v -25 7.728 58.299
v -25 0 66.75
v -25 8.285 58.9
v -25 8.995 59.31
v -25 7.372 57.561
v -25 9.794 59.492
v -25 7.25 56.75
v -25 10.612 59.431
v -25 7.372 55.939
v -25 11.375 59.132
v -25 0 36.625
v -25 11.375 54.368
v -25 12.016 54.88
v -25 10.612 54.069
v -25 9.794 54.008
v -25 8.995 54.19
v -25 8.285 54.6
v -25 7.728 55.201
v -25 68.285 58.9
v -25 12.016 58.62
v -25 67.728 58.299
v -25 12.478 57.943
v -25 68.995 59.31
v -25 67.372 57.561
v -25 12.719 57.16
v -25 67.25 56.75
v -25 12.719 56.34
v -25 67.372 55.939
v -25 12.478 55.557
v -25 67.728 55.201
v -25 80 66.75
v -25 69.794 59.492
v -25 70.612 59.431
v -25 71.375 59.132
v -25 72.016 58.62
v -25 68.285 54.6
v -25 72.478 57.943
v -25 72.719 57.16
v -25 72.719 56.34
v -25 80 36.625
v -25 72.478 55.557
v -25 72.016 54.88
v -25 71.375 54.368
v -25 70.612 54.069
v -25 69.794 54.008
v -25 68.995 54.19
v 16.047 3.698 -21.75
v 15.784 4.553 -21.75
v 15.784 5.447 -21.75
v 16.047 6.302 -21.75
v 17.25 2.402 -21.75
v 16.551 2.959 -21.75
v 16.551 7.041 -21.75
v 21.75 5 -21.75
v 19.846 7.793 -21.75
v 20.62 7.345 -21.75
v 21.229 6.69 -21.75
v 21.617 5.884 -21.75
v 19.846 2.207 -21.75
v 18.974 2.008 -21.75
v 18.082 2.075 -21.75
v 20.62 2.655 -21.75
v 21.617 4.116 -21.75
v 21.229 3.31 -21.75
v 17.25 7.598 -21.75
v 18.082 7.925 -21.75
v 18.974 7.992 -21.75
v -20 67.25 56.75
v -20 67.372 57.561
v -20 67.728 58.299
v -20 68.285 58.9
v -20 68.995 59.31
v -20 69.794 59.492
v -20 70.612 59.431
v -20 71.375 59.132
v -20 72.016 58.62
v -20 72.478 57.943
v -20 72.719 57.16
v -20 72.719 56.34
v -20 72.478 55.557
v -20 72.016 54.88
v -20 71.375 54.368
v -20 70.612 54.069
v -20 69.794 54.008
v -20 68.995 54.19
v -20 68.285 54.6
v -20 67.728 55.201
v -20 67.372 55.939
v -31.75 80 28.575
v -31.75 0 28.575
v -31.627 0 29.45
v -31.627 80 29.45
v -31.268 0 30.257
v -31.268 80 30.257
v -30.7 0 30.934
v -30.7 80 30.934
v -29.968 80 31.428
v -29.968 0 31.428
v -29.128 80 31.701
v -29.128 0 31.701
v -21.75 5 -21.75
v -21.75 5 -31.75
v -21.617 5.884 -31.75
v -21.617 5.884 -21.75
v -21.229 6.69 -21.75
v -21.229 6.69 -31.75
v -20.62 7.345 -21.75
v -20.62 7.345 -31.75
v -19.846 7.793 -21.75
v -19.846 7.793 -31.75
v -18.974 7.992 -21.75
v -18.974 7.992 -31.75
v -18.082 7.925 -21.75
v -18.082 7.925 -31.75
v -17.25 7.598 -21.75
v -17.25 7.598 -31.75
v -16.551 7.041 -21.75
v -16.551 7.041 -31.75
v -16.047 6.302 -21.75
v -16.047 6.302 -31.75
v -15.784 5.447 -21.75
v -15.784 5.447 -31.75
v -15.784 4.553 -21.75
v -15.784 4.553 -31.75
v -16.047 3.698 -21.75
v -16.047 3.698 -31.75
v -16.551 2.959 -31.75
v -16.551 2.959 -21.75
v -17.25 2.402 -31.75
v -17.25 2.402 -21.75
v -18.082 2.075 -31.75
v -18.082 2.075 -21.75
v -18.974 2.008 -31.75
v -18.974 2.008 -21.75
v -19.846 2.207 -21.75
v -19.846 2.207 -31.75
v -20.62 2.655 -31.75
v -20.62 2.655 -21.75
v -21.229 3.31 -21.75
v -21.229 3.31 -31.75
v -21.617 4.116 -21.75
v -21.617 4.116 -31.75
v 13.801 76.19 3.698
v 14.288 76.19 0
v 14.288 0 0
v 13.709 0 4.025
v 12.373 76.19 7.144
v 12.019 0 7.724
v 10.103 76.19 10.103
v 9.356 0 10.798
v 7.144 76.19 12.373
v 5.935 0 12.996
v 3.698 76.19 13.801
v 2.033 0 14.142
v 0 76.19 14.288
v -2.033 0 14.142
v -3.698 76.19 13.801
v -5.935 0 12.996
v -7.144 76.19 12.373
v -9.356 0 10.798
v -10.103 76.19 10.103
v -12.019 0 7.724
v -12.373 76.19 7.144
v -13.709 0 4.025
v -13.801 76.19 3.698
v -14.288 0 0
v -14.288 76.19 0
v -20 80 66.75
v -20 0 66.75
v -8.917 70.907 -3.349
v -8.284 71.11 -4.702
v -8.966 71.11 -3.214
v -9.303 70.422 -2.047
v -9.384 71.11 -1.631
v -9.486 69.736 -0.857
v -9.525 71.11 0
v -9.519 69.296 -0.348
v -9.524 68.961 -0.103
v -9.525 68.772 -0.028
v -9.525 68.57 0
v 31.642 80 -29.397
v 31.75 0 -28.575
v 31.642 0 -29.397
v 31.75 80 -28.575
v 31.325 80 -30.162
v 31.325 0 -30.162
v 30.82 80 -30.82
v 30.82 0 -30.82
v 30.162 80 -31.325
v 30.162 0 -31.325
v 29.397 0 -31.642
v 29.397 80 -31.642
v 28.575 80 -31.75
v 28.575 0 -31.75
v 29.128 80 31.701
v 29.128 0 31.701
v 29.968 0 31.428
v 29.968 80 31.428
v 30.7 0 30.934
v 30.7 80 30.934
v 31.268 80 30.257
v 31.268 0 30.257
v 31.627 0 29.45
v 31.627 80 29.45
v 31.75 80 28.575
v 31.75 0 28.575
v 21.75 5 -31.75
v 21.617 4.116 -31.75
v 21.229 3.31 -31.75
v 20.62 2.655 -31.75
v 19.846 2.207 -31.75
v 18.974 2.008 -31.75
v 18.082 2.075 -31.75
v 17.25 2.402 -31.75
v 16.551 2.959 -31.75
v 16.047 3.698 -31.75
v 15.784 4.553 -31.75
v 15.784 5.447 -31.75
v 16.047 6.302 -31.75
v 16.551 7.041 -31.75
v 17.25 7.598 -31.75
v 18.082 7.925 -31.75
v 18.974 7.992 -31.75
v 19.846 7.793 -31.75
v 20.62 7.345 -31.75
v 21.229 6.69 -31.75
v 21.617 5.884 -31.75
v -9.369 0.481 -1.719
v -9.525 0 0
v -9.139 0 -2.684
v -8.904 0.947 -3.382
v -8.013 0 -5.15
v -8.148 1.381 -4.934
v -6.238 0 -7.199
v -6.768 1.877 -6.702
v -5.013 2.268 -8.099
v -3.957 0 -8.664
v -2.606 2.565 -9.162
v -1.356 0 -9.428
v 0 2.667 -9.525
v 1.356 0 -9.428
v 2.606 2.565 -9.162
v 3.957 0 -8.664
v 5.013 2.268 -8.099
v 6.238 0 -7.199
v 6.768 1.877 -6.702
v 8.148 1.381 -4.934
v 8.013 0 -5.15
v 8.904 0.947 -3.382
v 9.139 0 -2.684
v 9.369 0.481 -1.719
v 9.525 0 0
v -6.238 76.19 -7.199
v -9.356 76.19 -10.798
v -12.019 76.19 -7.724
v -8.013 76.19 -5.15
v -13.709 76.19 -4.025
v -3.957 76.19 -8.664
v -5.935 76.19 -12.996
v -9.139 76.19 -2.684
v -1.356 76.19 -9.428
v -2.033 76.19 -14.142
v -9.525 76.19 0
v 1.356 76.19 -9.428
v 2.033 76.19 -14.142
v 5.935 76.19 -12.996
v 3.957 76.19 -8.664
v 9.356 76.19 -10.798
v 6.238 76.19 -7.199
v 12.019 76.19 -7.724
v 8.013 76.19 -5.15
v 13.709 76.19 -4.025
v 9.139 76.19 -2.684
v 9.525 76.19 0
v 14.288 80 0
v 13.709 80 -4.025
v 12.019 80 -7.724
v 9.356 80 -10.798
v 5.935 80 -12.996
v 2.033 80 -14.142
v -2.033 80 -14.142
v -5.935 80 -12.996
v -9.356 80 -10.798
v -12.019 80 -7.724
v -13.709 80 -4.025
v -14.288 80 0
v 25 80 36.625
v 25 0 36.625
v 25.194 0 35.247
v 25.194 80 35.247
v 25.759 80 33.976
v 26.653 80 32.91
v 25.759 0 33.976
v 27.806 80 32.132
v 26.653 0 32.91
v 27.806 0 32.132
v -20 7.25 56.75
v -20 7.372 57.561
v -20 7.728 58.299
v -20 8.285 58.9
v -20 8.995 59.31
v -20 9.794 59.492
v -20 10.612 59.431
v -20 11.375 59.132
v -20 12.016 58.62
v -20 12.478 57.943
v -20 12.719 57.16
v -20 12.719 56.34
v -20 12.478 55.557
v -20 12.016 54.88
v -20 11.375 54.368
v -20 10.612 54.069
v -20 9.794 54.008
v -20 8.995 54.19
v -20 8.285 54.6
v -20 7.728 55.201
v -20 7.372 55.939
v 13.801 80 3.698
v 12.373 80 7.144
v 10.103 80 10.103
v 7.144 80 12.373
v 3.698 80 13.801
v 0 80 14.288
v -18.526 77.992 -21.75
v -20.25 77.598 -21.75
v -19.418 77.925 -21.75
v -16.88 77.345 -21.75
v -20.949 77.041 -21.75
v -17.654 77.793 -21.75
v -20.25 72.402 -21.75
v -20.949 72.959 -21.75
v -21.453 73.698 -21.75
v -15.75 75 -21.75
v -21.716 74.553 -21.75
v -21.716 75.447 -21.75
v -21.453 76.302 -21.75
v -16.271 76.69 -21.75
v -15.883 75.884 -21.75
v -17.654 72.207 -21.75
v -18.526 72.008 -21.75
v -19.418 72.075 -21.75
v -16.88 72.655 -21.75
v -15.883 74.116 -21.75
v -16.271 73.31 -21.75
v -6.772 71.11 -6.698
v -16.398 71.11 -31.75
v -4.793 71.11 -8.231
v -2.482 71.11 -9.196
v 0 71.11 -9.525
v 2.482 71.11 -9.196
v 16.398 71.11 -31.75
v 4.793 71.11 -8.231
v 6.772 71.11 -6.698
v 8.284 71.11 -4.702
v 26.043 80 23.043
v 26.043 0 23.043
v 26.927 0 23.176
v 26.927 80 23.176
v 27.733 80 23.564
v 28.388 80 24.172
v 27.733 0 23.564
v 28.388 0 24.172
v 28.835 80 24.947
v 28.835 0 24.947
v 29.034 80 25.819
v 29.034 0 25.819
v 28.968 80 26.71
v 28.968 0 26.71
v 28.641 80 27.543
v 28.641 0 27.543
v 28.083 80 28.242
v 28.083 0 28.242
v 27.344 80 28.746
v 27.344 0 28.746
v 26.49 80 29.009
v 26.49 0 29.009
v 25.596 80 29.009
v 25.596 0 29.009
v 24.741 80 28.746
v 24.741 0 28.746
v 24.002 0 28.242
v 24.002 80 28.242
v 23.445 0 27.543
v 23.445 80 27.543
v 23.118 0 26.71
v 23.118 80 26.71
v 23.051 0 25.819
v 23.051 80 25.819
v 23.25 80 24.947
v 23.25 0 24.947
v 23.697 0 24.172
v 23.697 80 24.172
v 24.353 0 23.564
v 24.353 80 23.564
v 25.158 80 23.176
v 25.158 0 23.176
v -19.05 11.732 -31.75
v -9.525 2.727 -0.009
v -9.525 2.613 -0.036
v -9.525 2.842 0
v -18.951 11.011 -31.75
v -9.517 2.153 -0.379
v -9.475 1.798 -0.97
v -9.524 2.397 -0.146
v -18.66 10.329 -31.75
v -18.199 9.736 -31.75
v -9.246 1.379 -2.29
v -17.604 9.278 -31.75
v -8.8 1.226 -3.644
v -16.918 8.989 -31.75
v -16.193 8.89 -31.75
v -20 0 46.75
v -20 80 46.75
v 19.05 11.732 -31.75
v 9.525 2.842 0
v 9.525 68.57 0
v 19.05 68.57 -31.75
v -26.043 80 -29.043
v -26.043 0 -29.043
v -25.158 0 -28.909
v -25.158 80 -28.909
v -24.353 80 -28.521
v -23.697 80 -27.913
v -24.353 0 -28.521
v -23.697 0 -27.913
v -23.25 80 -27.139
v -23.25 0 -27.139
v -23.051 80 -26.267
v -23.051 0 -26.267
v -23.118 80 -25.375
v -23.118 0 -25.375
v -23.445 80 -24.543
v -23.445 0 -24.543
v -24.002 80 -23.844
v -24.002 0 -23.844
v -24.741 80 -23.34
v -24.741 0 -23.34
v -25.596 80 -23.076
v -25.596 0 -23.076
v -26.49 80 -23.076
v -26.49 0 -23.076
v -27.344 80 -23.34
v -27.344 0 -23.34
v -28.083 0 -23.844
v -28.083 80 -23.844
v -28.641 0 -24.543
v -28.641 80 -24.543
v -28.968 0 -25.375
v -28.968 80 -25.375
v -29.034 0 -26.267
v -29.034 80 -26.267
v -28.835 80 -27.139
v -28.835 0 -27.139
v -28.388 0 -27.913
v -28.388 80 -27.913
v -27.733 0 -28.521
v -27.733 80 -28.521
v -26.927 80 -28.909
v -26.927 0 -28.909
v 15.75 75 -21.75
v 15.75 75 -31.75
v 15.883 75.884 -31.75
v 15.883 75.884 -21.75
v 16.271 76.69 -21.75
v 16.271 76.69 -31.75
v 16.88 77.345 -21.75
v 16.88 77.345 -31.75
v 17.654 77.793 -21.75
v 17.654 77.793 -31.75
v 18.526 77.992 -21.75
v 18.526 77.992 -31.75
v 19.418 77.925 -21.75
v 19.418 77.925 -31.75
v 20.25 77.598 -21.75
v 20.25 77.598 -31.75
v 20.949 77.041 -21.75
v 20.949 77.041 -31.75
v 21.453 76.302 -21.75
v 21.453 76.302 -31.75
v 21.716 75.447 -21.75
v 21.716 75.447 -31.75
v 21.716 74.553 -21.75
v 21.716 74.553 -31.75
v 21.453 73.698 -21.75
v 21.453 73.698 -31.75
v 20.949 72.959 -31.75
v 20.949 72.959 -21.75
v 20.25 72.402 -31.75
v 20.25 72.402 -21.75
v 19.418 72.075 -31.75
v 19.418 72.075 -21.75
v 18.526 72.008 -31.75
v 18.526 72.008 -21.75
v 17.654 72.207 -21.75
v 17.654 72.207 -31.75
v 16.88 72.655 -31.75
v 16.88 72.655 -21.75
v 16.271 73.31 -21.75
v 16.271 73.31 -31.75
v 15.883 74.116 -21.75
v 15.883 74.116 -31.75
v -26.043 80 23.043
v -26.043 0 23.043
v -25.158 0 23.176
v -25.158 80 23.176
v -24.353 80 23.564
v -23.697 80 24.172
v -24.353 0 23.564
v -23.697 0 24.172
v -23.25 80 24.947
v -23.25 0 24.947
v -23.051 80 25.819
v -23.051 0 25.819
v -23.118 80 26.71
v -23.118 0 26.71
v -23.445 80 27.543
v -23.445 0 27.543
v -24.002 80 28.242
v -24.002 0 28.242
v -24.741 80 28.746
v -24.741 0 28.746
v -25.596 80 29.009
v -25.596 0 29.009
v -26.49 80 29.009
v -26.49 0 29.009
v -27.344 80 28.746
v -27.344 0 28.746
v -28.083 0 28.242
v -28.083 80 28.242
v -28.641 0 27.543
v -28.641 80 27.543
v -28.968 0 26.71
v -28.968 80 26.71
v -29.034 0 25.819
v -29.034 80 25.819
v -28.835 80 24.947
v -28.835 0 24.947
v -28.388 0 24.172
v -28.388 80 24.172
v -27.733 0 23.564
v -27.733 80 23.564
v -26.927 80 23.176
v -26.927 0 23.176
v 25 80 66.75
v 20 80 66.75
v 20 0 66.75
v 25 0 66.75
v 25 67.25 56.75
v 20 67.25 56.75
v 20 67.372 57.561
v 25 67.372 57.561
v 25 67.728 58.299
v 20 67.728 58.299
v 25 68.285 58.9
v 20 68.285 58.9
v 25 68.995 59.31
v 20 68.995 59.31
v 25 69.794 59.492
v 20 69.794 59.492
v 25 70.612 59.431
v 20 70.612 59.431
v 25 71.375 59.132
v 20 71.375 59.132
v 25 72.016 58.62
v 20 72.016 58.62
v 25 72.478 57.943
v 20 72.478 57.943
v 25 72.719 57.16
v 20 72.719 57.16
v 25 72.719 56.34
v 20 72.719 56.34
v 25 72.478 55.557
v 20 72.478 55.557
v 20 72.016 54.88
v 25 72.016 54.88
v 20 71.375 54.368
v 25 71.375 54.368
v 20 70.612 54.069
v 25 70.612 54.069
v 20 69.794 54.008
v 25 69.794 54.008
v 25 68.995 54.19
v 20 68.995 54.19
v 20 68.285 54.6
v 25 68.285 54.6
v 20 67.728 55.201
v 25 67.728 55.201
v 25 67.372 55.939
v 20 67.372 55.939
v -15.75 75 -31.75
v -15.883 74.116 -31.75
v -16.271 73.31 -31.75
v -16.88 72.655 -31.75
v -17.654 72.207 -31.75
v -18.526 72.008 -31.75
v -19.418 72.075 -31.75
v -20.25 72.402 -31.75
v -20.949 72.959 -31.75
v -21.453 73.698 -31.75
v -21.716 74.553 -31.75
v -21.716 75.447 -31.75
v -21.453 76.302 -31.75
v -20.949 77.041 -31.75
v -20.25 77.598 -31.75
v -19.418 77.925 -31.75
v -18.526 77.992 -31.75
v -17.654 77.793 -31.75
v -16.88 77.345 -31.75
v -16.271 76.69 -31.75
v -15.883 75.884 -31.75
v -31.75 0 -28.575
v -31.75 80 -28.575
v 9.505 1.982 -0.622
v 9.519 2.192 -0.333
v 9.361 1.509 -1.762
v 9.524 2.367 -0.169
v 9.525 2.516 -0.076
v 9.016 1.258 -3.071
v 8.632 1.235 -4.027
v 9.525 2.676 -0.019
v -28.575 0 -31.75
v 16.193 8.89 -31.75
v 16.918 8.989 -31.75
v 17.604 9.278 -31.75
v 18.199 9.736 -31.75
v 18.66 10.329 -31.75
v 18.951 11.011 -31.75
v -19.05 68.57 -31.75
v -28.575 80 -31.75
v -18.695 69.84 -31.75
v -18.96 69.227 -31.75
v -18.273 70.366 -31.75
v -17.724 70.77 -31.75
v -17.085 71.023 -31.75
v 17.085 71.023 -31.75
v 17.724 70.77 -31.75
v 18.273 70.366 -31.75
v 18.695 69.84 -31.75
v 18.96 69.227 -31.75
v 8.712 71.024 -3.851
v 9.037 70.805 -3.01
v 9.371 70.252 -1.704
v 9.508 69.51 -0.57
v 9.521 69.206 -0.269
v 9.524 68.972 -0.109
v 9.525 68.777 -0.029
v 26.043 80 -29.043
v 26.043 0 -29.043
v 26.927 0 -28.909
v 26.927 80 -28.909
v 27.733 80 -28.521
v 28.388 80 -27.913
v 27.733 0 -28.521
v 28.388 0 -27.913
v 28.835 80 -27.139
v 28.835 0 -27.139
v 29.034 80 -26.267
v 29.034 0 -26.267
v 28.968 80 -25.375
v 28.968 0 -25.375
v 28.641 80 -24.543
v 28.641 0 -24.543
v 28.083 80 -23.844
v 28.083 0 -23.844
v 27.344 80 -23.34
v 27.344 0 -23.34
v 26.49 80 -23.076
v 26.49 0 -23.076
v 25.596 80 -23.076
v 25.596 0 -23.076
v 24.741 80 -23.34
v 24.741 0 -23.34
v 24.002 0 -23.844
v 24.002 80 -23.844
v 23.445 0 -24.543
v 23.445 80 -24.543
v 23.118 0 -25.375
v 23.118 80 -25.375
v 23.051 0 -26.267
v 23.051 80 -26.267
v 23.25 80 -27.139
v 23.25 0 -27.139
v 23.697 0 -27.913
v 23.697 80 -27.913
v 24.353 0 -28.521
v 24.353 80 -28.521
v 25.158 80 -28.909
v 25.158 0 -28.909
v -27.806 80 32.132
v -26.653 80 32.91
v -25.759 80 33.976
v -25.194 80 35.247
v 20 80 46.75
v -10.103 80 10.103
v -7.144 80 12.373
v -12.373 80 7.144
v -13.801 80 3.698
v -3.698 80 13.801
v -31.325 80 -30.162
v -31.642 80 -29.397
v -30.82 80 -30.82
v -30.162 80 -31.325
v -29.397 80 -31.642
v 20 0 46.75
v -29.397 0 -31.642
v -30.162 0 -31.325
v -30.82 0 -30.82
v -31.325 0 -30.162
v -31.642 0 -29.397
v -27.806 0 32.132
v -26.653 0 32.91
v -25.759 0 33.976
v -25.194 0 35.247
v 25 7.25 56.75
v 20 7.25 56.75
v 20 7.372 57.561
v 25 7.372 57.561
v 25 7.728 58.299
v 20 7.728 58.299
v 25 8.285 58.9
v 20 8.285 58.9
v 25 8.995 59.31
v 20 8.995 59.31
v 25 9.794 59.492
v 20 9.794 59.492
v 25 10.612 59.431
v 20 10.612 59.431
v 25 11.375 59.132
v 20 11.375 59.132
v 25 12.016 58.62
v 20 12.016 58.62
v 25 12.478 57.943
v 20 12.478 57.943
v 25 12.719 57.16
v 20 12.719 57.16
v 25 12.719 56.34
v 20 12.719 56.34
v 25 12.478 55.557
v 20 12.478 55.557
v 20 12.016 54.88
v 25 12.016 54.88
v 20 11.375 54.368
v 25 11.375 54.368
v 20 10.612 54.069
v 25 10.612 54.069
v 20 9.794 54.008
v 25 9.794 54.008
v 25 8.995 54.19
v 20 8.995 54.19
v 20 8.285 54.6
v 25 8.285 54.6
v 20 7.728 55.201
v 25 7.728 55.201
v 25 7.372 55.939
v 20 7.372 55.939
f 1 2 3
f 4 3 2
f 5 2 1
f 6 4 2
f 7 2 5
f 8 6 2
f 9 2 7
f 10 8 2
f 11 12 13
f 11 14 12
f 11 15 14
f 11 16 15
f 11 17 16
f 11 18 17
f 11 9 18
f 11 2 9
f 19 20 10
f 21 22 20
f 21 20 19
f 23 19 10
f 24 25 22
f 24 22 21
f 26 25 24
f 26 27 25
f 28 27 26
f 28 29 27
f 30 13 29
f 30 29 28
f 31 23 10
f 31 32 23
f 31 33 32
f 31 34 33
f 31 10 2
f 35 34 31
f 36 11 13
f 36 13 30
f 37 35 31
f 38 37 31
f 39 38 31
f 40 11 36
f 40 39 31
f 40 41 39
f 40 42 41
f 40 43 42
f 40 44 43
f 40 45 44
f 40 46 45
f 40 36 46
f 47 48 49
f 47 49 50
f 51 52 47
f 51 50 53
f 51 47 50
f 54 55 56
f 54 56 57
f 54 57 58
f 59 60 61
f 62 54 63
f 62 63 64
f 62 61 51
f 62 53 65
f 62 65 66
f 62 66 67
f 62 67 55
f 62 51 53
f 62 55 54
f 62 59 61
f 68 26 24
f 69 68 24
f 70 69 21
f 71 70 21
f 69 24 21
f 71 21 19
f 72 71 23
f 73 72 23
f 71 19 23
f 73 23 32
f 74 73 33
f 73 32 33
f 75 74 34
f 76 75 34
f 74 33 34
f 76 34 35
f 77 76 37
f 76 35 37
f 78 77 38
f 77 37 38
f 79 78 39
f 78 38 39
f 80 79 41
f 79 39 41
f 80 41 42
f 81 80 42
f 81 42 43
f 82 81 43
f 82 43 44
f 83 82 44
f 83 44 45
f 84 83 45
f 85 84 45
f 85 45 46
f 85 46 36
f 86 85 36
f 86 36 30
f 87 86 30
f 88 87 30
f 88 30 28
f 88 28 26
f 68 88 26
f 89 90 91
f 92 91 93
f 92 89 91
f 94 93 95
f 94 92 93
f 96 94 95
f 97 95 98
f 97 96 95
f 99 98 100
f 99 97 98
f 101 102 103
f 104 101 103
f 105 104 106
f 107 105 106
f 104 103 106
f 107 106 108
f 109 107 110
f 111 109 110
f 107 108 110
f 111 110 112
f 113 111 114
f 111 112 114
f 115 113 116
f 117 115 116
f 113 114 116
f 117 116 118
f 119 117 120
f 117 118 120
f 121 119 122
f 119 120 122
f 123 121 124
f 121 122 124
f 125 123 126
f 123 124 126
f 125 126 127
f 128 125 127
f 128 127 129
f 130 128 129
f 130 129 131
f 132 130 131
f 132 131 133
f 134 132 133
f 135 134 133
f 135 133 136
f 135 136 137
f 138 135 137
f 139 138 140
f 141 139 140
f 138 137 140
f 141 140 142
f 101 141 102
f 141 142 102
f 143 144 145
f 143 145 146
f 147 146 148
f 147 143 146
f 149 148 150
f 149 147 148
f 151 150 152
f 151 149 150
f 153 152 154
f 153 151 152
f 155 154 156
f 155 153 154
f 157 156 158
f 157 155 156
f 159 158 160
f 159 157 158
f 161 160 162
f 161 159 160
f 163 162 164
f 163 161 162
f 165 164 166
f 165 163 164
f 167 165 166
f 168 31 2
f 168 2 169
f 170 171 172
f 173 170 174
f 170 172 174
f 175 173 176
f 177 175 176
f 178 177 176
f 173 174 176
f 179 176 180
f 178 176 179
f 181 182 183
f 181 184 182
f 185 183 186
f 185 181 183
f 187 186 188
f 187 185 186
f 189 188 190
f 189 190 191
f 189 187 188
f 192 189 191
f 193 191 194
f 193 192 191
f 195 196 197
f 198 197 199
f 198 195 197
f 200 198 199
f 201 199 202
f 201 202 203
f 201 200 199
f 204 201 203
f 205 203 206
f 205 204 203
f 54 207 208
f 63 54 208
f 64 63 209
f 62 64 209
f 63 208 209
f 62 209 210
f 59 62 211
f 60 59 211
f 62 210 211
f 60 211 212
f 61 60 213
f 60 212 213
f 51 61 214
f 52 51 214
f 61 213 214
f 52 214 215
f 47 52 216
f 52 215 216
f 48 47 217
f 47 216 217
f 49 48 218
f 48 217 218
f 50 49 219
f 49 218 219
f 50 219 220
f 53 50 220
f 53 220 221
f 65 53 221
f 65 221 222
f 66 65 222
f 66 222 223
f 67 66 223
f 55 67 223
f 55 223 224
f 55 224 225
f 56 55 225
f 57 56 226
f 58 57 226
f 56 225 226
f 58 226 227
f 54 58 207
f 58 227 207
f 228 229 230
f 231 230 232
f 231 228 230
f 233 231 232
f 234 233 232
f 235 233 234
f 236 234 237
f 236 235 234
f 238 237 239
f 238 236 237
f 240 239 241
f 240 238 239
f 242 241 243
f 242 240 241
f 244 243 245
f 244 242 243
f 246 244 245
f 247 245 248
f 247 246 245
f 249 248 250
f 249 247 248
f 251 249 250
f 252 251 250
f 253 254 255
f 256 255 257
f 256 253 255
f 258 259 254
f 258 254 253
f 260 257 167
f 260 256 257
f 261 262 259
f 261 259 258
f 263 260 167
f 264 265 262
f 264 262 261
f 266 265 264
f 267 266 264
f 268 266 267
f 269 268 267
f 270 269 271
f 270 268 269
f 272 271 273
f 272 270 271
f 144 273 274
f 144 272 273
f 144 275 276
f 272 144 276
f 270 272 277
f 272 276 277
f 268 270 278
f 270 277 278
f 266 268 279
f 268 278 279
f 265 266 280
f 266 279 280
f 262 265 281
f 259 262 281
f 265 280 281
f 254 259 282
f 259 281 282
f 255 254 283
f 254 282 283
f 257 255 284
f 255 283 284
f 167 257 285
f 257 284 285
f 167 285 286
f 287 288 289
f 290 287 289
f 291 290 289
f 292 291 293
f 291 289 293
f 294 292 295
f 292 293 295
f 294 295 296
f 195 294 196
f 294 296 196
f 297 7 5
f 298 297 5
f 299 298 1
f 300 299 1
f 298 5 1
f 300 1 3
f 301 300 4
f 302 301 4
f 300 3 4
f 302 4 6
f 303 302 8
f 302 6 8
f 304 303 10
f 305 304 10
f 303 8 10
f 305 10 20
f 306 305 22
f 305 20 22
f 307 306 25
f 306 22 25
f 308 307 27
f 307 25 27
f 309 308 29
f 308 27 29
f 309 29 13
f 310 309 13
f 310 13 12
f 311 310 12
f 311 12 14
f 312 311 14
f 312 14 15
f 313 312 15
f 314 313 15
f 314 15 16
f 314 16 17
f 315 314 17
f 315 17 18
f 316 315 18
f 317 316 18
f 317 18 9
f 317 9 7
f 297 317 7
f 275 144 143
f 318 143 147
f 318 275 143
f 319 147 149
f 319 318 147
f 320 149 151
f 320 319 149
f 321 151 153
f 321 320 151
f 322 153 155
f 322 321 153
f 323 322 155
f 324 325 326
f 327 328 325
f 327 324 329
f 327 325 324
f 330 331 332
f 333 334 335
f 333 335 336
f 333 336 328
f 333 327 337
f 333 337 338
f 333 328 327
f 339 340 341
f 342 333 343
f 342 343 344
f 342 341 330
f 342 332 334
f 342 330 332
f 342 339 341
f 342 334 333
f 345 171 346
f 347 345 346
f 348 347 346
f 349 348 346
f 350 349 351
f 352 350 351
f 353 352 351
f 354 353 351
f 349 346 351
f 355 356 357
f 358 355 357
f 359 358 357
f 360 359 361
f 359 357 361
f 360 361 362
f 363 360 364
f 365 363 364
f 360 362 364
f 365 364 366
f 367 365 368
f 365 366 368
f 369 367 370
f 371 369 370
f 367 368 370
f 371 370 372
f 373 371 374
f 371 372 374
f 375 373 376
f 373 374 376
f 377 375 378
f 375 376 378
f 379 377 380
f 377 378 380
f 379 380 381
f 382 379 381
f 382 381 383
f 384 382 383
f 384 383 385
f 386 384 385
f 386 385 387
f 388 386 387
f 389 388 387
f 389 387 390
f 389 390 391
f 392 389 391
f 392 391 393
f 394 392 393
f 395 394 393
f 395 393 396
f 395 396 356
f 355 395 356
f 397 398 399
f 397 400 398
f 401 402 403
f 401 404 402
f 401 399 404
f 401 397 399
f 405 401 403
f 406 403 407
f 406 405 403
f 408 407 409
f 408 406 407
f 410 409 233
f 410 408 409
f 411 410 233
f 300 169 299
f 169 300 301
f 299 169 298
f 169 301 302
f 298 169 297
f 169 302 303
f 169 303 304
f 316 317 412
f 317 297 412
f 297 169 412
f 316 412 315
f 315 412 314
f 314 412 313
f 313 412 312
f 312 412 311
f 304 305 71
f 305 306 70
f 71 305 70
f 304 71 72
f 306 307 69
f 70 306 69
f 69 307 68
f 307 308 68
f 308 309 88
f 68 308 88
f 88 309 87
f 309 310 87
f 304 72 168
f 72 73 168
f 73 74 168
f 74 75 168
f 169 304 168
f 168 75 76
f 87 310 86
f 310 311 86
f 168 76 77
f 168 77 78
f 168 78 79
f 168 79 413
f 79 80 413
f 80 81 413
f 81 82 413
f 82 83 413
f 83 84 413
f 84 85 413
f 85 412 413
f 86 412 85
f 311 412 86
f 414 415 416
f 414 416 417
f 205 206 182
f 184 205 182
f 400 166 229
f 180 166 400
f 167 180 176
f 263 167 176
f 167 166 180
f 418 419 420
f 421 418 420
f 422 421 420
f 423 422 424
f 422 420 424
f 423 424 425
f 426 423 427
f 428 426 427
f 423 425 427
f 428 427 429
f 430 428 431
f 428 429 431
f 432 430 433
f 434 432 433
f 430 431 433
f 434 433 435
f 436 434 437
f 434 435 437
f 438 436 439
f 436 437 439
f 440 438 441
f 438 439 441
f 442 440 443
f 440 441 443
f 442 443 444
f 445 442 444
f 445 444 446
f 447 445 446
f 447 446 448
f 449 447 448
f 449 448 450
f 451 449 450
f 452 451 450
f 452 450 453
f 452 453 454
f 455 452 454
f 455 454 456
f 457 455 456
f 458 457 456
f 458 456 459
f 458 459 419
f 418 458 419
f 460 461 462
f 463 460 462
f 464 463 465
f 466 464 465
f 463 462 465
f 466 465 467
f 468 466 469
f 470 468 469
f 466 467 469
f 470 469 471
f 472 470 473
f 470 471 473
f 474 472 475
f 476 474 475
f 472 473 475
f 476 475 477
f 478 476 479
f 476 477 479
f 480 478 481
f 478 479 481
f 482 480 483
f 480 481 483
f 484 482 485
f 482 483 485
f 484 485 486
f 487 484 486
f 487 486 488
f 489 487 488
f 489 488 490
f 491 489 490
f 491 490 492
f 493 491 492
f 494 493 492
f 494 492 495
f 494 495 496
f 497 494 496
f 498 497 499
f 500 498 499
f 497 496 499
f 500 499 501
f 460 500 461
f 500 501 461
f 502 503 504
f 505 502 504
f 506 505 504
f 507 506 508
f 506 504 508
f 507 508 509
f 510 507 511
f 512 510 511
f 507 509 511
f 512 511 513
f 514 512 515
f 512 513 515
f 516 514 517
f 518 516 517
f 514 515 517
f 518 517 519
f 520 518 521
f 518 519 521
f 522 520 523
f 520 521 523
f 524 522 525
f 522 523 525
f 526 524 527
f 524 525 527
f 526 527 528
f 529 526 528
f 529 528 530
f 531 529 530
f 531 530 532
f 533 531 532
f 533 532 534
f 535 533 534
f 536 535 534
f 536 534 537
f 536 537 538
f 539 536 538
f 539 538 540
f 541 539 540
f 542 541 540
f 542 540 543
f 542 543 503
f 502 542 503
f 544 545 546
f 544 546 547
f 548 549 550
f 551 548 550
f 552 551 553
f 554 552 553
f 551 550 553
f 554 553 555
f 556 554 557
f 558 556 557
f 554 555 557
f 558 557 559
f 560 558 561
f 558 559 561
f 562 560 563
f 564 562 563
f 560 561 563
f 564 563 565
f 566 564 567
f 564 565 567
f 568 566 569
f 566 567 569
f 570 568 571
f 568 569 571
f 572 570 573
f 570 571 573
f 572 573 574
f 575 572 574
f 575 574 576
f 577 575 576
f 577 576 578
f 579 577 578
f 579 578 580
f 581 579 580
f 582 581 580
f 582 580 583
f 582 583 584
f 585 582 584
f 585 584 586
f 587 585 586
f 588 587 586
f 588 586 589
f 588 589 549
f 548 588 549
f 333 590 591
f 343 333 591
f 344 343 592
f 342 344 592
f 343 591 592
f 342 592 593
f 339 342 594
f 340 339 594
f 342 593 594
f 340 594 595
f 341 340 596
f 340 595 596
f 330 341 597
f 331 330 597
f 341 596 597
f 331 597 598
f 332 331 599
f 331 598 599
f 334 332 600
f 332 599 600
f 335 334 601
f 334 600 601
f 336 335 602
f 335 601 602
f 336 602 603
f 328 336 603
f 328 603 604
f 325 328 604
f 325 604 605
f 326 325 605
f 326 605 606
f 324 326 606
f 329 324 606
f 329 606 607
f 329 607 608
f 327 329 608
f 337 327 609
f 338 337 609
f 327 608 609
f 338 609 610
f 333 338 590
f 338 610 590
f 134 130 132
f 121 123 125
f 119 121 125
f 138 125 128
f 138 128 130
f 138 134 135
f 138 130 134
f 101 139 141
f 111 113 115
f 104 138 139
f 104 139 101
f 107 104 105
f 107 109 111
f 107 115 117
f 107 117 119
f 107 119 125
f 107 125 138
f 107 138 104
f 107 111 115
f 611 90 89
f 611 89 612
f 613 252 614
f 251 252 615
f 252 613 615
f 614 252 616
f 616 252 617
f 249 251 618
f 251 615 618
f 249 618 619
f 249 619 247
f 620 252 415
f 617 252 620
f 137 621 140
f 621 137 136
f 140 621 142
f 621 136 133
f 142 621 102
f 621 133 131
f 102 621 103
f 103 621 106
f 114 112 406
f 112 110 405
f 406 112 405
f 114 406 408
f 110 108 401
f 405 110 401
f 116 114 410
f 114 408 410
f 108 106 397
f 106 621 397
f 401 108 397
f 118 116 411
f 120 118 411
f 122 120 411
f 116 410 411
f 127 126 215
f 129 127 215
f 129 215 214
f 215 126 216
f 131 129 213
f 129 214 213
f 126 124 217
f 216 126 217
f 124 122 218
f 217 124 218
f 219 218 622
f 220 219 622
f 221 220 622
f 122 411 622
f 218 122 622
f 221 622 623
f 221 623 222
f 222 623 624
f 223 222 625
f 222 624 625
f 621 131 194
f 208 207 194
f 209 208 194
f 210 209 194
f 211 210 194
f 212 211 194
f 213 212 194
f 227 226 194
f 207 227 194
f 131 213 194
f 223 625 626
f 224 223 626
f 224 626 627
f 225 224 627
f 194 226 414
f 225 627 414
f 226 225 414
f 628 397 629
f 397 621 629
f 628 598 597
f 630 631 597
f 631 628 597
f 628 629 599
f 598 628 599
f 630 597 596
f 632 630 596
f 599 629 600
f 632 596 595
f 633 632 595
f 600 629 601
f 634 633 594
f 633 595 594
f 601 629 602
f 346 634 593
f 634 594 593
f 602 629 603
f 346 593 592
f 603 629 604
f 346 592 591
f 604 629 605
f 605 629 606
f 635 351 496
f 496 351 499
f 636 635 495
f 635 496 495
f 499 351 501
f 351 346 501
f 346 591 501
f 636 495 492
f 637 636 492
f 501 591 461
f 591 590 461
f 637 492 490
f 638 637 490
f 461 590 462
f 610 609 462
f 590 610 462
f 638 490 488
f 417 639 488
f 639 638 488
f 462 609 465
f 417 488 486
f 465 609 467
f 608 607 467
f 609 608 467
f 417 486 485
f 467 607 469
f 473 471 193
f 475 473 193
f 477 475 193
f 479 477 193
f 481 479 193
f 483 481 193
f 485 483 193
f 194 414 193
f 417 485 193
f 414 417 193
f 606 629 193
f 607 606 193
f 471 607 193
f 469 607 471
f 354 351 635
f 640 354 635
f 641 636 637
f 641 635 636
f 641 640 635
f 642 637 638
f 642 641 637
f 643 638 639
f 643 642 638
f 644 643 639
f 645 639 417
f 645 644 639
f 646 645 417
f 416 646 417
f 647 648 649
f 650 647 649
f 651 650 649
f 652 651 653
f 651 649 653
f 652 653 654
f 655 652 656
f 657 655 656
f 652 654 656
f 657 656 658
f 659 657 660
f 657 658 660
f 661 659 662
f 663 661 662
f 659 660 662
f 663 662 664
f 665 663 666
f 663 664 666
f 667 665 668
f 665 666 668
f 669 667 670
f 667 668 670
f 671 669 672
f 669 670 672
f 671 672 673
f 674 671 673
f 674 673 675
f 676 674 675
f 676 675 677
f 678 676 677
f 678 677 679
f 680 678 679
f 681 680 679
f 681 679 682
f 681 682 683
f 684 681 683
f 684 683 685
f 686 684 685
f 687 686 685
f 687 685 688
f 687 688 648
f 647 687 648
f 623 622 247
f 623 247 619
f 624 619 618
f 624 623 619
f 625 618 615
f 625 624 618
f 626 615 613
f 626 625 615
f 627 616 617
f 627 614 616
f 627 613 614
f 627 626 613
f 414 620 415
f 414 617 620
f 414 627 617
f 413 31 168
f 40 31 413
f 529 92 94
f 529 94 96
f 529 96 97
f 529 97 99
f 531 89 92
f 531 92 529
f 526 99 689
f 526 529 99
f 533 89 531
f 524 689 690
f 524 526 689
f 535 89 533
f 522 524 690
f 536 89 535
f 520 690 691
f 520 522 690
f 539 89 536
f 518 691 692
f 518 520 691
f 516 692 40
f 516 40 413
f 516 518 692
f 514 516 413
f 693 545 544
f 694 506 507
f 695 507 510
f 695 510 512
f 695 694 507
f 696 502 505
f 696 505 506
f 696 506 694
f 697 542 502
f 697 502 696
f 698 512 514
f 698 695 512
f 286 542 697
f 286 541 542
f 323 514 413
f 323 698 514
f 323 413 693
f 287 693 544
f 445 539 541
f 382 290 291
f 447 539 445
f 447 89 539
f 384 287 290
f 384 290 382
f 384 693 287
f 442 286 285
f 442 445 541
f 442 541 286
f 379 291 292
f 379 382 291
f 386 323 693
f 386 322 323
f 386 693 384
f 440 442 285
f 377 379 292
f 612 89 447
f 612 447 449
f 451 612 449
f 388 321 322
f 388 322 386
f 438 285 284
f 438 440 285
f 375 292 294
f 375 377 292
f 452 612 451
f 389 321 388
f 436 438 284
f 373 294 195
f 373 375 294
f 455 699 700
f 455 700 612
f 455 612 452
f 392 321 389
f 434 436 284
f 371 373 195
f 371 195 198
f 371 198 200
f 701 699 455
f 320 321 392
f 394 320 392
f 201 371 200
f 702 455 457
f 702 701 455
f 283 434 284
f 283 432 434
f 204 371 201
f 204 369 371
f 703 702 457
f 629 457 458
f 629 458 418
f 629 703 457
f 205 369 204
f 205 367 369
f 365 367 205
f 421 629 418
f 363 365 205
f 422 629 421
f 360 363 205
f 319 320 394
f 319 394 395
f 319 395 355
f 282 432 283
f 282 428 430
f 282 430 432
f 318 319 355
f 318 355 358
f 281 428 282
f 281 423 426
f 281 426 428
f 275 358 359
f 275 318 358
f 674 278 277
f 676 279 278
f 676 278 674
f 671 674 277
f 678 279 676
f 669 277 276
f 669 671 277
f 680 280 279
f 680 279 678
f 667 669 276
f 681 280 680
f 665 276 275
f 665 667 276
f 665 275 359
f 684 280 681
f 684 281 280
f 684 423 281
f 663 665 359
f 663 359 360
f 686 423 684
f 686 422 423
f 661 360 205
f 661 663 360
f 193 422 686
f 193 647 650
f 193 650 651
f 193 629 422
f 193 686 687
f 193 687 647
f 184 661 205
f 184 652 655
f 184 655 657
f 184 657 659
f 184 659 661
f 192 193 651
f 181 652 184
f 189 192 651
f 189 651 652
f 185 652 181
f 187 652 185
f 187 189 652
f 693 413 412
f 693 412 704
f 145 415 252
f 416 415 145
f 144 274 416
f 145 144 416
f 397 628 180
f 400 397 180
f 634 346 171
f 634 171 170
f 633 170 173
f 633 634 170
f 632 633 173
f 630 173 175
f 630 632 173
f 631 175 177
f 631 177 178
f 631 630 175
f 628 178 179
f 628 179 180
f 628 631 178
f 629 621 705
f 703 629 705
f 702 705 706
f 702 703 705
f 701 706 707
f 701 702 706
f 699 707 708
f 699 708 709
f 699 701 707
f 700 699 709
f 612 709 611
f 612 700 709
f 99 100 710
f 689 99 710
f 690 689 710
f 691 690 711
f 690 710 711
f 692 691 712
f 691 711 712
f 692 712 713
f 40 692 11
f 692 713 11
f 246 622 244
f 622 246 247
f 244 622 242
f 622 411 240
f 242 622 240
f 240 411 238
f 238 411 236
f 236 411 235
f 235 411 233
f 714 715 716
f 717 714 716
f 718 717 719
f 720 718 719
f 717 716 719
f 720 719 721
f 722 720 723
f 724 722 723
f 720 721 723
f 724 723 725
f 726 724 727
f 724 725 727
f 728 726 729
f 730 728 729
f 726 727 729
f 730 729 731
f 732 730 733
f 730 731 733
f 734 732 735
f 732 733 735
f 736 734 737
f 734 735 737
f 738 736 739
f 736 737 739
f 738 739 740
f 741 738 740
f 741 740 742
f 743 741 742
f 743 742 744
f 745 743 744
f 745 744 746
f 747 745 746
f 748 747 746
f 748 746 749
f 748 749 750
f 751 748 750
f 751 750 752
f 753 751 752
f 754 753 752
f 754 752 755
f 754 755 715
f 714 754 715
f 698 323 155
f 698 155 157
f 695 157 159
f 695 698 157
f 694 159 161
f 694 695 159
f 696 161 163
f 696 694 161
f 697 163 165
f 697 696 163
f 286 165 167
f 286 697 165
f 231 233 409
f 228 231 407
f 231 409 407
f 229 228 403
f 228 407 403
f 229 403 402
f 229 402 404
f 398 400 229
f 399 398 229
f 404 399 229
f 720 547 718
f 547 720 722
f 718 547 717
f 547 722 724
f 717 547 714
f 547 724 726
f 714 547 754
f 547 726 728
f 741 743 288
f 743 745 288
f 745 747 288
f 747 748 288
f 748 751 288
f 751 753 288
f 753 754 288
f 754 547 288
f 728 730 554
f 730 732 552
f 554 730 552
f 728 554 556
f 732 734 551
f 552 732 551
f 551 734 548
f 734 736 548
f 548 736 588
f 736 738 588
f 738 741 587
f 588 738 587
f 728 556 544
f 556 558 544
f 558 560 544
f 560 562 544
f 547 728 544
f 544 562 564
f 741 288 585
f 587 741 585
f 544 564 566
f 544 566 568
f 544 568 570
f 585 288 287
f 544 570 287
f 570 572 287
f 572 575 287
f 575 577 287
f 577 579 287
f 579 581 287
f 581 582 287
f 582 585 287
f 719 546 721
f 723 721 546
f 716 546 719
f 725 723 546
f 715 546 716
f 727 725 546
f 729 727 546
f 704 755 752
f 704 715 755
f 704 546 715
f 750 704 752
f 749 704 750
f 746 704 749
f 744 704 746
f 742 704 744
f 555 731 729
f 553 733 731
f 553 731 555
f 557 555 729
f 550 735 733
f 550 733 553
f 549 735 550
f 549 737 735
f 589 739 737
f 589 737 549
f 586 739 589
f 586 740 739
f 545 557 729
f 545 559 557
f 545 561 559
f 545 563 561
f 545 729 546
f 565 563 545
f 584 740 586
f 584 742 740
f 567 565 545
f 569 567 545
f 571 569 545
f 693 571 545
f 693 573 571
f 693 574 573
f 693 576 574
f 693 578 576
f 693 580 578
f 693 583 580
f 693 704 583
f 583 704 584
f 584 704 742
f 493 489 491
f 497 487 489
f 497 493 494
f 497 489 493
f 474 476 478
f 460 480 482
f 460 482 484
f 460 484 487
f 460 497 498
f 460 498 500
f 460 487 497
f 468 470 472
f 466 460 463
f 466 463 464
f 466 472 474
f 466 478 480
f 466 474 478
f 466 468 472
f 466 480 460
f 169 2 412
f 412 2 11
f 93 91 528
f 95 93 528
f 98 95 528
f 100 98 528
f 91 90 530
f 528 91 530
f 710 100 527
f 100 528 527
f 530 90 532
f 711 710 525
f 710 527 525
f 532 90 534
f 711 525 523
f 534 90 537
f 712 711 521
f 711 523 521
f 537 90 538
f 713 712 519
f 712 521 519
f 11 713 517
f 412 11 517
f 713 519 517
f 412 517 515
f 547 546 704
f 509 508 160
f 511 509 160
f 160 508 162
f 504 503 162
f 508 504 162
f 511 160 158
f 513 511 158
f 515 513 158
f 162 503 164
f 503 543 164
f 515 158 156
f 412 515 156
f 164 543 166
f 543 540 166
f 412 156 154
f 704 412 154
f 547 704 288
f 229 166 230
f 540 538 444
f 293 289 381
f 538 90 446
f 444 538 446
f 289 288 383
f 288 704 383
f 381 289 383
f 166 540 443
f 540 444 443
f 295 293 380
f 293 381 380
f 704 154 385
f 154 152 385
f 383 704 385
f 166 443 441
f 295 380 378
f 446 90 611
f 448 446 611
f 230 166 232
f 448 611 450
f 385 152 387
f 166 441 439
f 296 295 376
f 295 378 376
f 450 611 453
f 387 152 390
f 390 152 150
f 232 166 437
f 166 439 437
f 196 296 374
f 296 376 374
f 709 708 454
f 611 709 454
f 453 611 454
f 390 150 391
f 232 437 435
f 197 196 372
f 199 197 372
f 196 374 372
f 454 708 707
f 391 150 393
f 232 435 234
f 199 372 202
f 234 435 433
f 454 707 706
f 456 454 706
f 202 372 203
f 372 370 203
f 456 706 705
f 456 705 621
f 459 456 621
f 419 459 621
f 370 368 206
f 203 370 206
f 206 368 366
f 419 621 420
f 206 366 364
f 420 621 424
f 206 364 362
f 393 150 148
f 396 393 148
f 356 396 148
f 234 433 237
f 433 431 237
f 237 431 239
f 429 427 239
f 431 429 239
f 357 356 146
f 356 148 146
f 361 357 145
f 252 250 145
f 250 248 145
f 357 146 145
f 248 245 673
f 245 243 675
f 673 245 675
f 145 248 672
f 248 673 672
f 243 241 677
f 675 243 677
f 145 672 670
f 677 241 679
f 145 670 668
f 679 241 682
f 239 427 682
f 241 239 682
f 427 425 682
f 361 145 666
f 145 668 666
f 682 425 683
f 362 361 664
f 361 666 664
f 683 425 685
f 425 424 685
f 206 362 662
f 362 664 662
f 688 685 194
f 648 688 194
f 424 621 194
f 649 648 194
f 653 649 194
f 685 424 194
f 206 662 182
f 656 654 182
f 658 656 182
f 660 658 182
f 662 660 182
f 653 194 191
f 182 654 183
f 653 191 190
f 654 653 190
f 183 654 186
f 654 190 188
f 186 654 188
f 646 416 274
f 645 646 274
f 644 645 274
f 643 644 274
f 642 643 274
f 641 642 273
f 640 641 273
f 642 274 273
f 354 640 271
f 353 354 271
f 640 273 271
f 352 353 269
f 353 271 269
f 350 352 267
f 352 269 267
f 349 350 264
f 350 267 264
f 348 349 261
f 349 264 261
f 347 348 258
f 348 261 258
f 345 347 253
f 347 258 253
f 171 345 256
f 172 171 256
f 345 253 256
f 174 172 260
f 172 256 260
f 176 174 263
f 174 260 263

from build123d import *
from build123d.topology import SkipClean

# Parameters (mm, degrees)
SKETCH2_W                      = 63.5
SKETCH2_H                      = 63.5
BOSS_EXTRUDE1_DEPTH            = 80
CUT_EXTRUDE1_REACH             = 93.739
SKETCH4_R                      = 14.2875
CUT_EXTRUDE2_DEPTH             = 3.81
CUT_EXTRUDE3_DEPTH             = 62.22
CUT_EXTRUDE4_REACH             = 93.739
CUT_EXTRUDE4_DIRECTION_2_REACH = 93.739
FILLET2_R                      = 2.54
SKETCH9_W                      = 5
SKETCH9_H                      = 80
BOSS_EXTRUDE2_DEPTH            = 35
SKETCH10_R                     = 2.75
CUT_EXTRUDE6_DEPTH             = 119.642846392
CUT_EXTRUDE7_REACH             = 110.92
SKETCH11_R                     = 3
SKETCH12_W                     = 40
SKETCH12_H                     = 80
BOSS_EXTRUDE3_DEPTH            = 15
SKETCH13_R                     = 3
CUT_EXTRUDE8_DEPTH             = 10
FILLET3_R                      = 3.175
FILLET4_DEPTH                  = 80


with BuildPart() as part:
    # Sketch2 → Boss-Extrude1 (new body)
    with BuildSketch(Plane(origin=(0, 0, 0), x_dir=(1, 0, 0), z_dir=(0, 1, 0))):
        Rectangle(SKETCH2_W, SKETCH2_H)
    extrude(amount=BOSS_EXTRUDE1_DEPTH)

    # Sketch3 → Cut-Extrude1 (cut, up to next)
    with BuildSketch(Plane(origin=(0, 80, 0), x_dir=(1, 0, 0), z_dir=(0, 1, 0)), mode=Mode.PRIVATE) as cut_extrude1_sk1:
        with BuildLine():
            Line((9.525, 0), (14.2875, 0))
            ThreePointArc((14.2875, 0), (0, -14.2875), (-14.2875, 0))
            Line((-14.2875, 0), (-9.525, 0))
            ThreePointArc((-9.525, 0), (0, 9.525), (9.525, 0))
        make_face()
    cut_extrude1_tool1 = extrude(cut_extrude1_sk1.sketch, amount=-CUT_EXTRUDE1_REACH, mode=Mode.PRIVATE) & part.part
    add(cut_extrude1_tool1.solids().sort_by_distance((0, 80, 2.954161))[0], mode=Mode.SUBTRACT)

    # Sketch4 → Cut-Extrude2 (cut)
    with BuildSketch(Plane(origin=(0, 80, 0), x_dir=(1, 0, 0), z_dir=(0, 1, 0))):
        with Locations(Location((0, 0, 0), (0, 0, 270))):
            Circle(SKETCH4_R)
    extrude(amount=-CUT_EXTRUDE2_DEPTH, mode=Mode.SUBTRACT)

    # Sketch6 → Cut-Extrude3 (cut)
    with BuildSketch(Plane(origin=(0, 71.11, 0), x_dir=(1, 0, 0), z_dir=(0, 1, 0))):
        with BuildLine():
            Line((9.525, 0), (19.05, 31.75))
            Line((19.05, 31.75), (-19.05, 31.75))
            Line((-19.05, 31.75), (-9.525, 0))
            ThreePointArc((-9.525, 0), (0, 9.525), (9.525, 0))
        make_face()
    extrude(amount=-CUT_EXTRUDE3_DEPTH, mode=Mode.SUBTRACT)

    # Cut-Extrude4: up to this plane
    with SkipClean():  # the faces are left unmerged after this step: merging them gives an invalid solid
        cut_extrude4_end = Plane(origin=(-9.525, -49.595085442, 0), z_dir=(-0.9578262852211514, 0, 0.2873478855663456))
        # Sketch7 → Cut-Extrude4 (cut, up to the surface)
        with BuildSketch(Plane(origin=(0, 0, 0), x_dir=(0, 0, -1), z_dir=(1, 0, 0)), mode=Mode.PRIVATE) as cut_extrude4_sk1:
            Polygon((0, 8.89), (31.75, 8.89), (0, 0), align=None)
        cut_extrude4_tool1 = split(extrude(cut_extrude4_sk1.sketch, amount=-CUT_EXTRUDE4_REACH, mode=Mode.PRIVATE), bisect_by=cut_extrude4_end, keep=Keep.BOTH, mode=Mode.PRIVATE)
        add(cut_extrude4_tool1.solids().sort_by_distance((0, 5.926667, -10.583333))[0], mode=Mode.SUBTRACT)

    # Cut-Extrude4 direction 2: up to this plane
    cut_extrude4_direction_2_end = Plane(origin=(9.525, -49.595085442, 0), z_dir=(0.9578262852211514, 0, 0.2873478855663456))
    # Sketch7 → Cut-Extrude4 direction 2 (cut, up to the surface)
    with BuildSketch(Plane(origin=(0, 0, 0), x_dir=(0, 0, -1), z_dir=(1, 0, 0)), mode=Mode.PRIVATE) as cut_extrude4_direction_2_sk1:
        Polygon((0, 8.89), (31.75, 8.89), (0, 0), align=None)
    cut_extrude4_direction_2_tool1 = split(extrude(cut_extrude4_direction_2_sk1.sketch, amount=CUT_EXTRUDE4_DIRECTION_2_REACH, mode=Mode.PRIVATE), bisect_by=cut_extrude4_direction_2_end, keep=Keep.BOTH, mode=Mode.PRIVATE)
    add(cut_extrude4_direction_2_tool1.solids().sort_by_distance((0, 5.926667, -10.583333))[0], mode=Mode.SUBTRACT)

    # Fillet2
    # the kernel refuses this fillet: 2.54 mm, written as the material it adds along each edge
    with BuildSketch(Plane(origin=(7.700340927, 71.11, 6.082196911), x_dir=(-0.9578262852211513, 0, -0.2873478855663455), z_dir=(0.28734788556634555, 0, -0.9578262852211513))) as fillet2_piece_1_section:
        with BuildLine():
            CenterArc((FILLET2_R, -FILLET2_R), FILLET2_R, 90, 90)
            Line((0, -FILLET2_R), (0, 0))
            Line((0, 0), (FILLET2_R, 0))
        make_face()
    fillet2_piece_1 = extrude(amount=45.847973166, mode=Mode.PRIVATE)
    fillet2_piece_1 = split(fillet2_piece_1, bisect_by=Plane(origin=(7.700340927, 71.11, -31.75), z_dir=(0, 0, 1)), keep=Keep.TOP, mode=Mode.PRIVATE)
    fillet2_piece_1 = fillet2_piece_1 - Plane(origin=(0, 71.11, 0), x_dir=(-1, 0, 0), z_dir=(0, 1, 0)) * Cylinder(9.525, 102, mode=Mode.PRIVATE)
    fillet2_piece_1 = split(fillet2_piece_1, bisect_by=Plane(origin=(7.700340927, 71.11, 0), z_dir=(0, 0, -1)), keep=Keep.TOP, mode=Mode.PRIVATE)
    add(fillet2_piece_1)
    with BuildSketch(Plane(origin=(-20.874659073, 71.11, -37.832196911), x_dir=(0, -1, 0), z_dir=(0.28734788556634555, 0, 0.9578262852211513))) as fillet2_piece_2_section:
        with BuildLine():
            CenterArc((FILLET2_R, FILLET2_R), FILLET2_R, 180, 90)
            Line((0, FILLET2_R), (0, 0))
            Line((0, 0), (FILLET2_R, 0))
        make_face()
    fillet2_piece_2 = extrude(amount=45.847973166, mode=Mode.PRIVATE)
    fillet2_piece_2 = split(fillet2_piece_2, bisect_by=Plane(origin=(-20.874659073, 71.11, -31.75), z_dir=(0, 0, 1)), keep=Keep.TOP, mode=Mode.PRIVATE)
    fillet2_piece_2 = split(fillet2_piece_2, bisect_by=Plane(origin=(-20.874659073, 71.11, 0), z_dir=(0, 0, -1)), keep=Keep.TOP, mode=Mode.PRIVATE)
    fillet2_piece_2 = fillet2_piece_2 - Plane(origin=(0, 71.11, 0), x_dir=(-1, 0, 0), z_dir=(0, 1, 0)) * Cylinder(9.525, 102, mode=Mode.PRIVATE)
    add(fillet2_piece_2)
    with BuildSketch(Plane(origin=(-20.954648619, 10.667672044, -38.098828729), x_dir=(0.9607141016314922, 0.07483307171461691, -0.2672609704093551), z_dir=(0.2775399339309484, -0.2590372716688848, 0.9251331131031606))) as fillet2_piece_3_section:
        with BuildLine():
            CenterArc((FILLET2_R * 1.08072615035, FILLET2_R), FILLET2_R, 175.556407911, 94.443592089)
            Line((FILLET2_R * 0.0837320564804, FILLET2_R * 1.07747758898), (0, 0))
            Line((0, 0), (FILLET2_R * 1.08072615035, 0))
        make_face()
    fillet2_piece_3 = extrude(amount=52.848435405, mode=Mode.PRIVATE)
    fillet2_piece_3 = split(fillet2_piece_3, bisect_by=Plane(origin=(-20.954648619, 10.667672044, -31.75), z_dir=(0, 0, 1)), keep=Keep.TOP, mode=Mode.PRIVATE)
    fillet2_piece_3 = fillet2_piece_3 - Plane(origin=(0, 10.667672044, 0), x_dir=(-1, 0, 0), z_dir=(0, 1, 0)) * Cylinder(9.525, 117, mode=Mode.PRIVATE)
    fillet2_piece_3 = split(fillet2_piece_3, bisect_by=Plane(origin=(-20.954648619, 10.667672044, 0), z_dir=(0, 0, -1)), keep=Keep.TOP, mode=Mode.PRIVATE)
    add(fillet2_piece_3)
    with BuildSketch(Plane(origin=(20.954648619, 10.667672044, -38.098828729), x_dir=(-0.9607141016314922, 0.07483307171461691, -0.2672609704093551), z_dir=(-0.2775399339309484, -0.2590372716688848, 0.9251331131031606))) as fillet2_piece_4_section:
        with BuildLine():
            CenterArc((FILLET2_R * 1.08072615035, -FILLET2_R), FILLET2_R, 90, 94.443592089)
            Line((FILLET2_R * 0.0837320564804, -FILLET2_R * 1.07747758898), (0, 0))
            Line((0, 0), (FILLET2_R * 1.08072615035, 0))
        make_face()
    fillet2_piece_4 = extrude(amount=52.848435405, mode=Mode.PRIVATE)
    fillet2_piece_4 = split(fillet2_piece_4, bisect_by=Plane(origin=(20.954648619, 10.667672044, -31.75), z_dir=(0, 0, 1)), keep=Keep.TOP, mode=Mode.PRIVATE)
    fillet2_piece_4 = fillet2_piece_4 - Plane(origin=(0, 10.667672044, 0), x_dir=(-1, 0, 0), z_dir=(0, 1, 0)) * Cylinder(9.525, 117, mode=Mode.PRIVATE)
    fillet2_piece_4 = split(fillet2_piece_4, bisect_by=Plane(origin=(20.954648619, 10.667672044, 0), z_dir=(0, 0, -1)), keep=Keep.TOP, mode=Mode.PRIVATE)
    add(fillet2_piece_4)

    # Sketch9 → Boss-Extrude2 (add)
    with BuildSketch(Plane.XY.offset(31.75)):
        with Locations((-22.5, 40)):
            Rectangle(SKETCH9_W, SKETCH9_H)
        with Locations((22.5, 40)):
            Rectangle(SKETCH9_W, SKETCH9_H)
    extrude(amount=BOSS_EXTRUDE2_DEPTH)

    # Sketch10 → Cut-Extrude6 (cut, through all)
    with BuildSketch(Plane.ZY.offset(25)):
        with Locations(Location((56.75, 70, 0), (0, 0, 270))):
            Circle(SKETCH10_R)
        with Locations(Location((56.75, 10, 0), (0, 0, 270))):
            Circle(SKETCH10_R)
    extrude(amount=-CUT_EXTRUDE6_DEPTH, mode=Mode.SUBTRACT)

    # Sketch11 → Cut-Extrude7 (cut, up to next)
    with BuildSketch(Plane.XZ, mode=Mode.PRIVATE) as cut_extrude7_sk1:
        with Locations(Location((26.042742751, -26.042742751, 0), (0, 0, 270))):
            Circle(SKETCH11_R)
    cut_extrude7_tool1 = extrude(cut_extrude7_sk1.sketch, amount=-CUT_EXTRUDE7_REACH, mode=Mode.PRIVATE) & part.part
    # Sketch11 → Cut-Extrude7 (cut, up to next)
    with BuildSketch(Plane.XZ, mode=Mode.PRIVATE) as cut_extrude7_sk2:
        with Locations(Location((26.042742751, 26.042742751, 0), (0, 0, 270))):
            Circle(SKETCH11_R)
    cut_extrude7_tool2 = extrude(cut_extrude7_sk2.sketch, amount=-CUT_EXTRUDE7_REACH, mode=Mode.PRIVATE) & part.part
    # Sketch11 → Cut-Extrude7 (cut, up to next)
    with BuildSketch(Plane.XZ, mode=Mode.PRIVATE) as cut_extrude7_sk3:
        with Locations(Location((-26.042742751, -26.042742751, 0), (0, 0, 270))):
            Circle(SKETCH11_R)
    cut_extrude7_tool3 = extrude(cut_extrude7_sk3.sketch, amount=-CUT_EXTRUDE7_REACH, mode=Mode.PRIVATE) & part.part
    # Sketch11 → Cut-Extrude7 (cut, up to next)
    with BuildSketch(Plane.XZ, mode=Mode.PRIVATE) as cut_extrude7_sk4:
        with Locations(Location((-26.042742751, 26.042742751, 0), (0, 0, 270))):
            Circle(SKETCH11_R)
    cut_extrude7_tool4 = extrude(cut_extrude7_sk4.sketch, amount=-CUT_EXTRUDE7_REACH, mode=Mode.PRIVATE) & part.part
    add(cut_extrude7_tool1.solids().sort_by_distance((26.042743, 0, -26.042743))[0], mode=Mode.SUBTRACT)
    add(cut_extrude7_tool2.solids().sort_by_distance((26.042743, 0, 26.042743))[0], mode=Mode.SUBTRACT)
    add(cut_extrude7_tool3.solids().sort_by_distance((-26.042743, 0, -26.042743))[0], mode=Mode.SUBTRACT)
    add(cut_extrude7_tool4.solids().sort_by_distance((-26.042743, 0, 26.042743))[0], mode=Mode.SUBTRACT)

    # Sketch12 → Boss-Extrude3 (add)
    with BuildSketch(Plane.XY.offset(31.75)):
        with Locations((0, 40)):
            Rectangle(SKETCH12_W, SKETCH12_H)
    extrude(amount=BOSS_EXTRUDE3_DEPTH)

    # Sketch13 → Cut-Extrude8 (cut)
    with BuildSketch(Plane(origin=(0, 0, -31.75), x_dir=(-1, 0, 0), z_dir=(0, 0, -1))):
        with Locations((-18.75, 75)):
            Circle(SKETCH13_R)
        with Locations(Location((18.75, 75, 0), (0, 0, 180))):
            Circle(SKETCH13_R)
        with Locations((18.75, 5)):
            Circle(SKETCH13_R)
        with Locations(Location((-18.75, 5, 0), (0, 0, 180))):
            Circle(SKETCH13_R)
    extrude(amount=-CUT_EXTRUDE8_DEPTH, mode=Mode.SUBTRACT)

    # Fillet3
    fillet3_edges = [part.edges().sort_by_distance(p)[0] for p in [
        (31.75, 40, 31.75),
        (-31.75, 40, 31.75),
        (-31.75, 40, -31.75),
        (31.75, 40, -31.75),
    ]]
    fillet(fillet3_edges, radius=FILLET3_R)

    # Fillet4: read off the stored shape, not the designer's step
    # Fillet4 outline → Fillet4 (add)
    with BuildSketch(Plane(origin=(0, 0, 0), x_dir=(1, 0, 0), z_dir=(0, 1, 0))):
        with BuildLine():
            Line((25, -31.75), (25, -36.624844719))
            ThreePointArc((25, -36.624844719), (26.168694859, -33.412197692), (29.128440367, -31.701392291))
            ThreePointArc((29.128440367, -31.701392291), (28.852785416, -31.737824728), (28.575, -31.75))
            Line((28.575, -31.75), (25, -31.75))
        make_face()
        with BuildLine():
            ThreePointArc((-28.575, -31.75), (-28.852785416, -31.737824728), (-29.128440367, -31.701392291))
            ThreePointArc((-29.128440367, -31.701392291), (-26.168694859, -33.412197692), (-25, -36.624844719))
            Line((-25, -36.624844719), (-25, -31.75))
            Line((-25, -31.75), (-28.575, -31.75))
        make_face()
    extrude(amount=FILLET4_DEPTH)


solid = part.part
